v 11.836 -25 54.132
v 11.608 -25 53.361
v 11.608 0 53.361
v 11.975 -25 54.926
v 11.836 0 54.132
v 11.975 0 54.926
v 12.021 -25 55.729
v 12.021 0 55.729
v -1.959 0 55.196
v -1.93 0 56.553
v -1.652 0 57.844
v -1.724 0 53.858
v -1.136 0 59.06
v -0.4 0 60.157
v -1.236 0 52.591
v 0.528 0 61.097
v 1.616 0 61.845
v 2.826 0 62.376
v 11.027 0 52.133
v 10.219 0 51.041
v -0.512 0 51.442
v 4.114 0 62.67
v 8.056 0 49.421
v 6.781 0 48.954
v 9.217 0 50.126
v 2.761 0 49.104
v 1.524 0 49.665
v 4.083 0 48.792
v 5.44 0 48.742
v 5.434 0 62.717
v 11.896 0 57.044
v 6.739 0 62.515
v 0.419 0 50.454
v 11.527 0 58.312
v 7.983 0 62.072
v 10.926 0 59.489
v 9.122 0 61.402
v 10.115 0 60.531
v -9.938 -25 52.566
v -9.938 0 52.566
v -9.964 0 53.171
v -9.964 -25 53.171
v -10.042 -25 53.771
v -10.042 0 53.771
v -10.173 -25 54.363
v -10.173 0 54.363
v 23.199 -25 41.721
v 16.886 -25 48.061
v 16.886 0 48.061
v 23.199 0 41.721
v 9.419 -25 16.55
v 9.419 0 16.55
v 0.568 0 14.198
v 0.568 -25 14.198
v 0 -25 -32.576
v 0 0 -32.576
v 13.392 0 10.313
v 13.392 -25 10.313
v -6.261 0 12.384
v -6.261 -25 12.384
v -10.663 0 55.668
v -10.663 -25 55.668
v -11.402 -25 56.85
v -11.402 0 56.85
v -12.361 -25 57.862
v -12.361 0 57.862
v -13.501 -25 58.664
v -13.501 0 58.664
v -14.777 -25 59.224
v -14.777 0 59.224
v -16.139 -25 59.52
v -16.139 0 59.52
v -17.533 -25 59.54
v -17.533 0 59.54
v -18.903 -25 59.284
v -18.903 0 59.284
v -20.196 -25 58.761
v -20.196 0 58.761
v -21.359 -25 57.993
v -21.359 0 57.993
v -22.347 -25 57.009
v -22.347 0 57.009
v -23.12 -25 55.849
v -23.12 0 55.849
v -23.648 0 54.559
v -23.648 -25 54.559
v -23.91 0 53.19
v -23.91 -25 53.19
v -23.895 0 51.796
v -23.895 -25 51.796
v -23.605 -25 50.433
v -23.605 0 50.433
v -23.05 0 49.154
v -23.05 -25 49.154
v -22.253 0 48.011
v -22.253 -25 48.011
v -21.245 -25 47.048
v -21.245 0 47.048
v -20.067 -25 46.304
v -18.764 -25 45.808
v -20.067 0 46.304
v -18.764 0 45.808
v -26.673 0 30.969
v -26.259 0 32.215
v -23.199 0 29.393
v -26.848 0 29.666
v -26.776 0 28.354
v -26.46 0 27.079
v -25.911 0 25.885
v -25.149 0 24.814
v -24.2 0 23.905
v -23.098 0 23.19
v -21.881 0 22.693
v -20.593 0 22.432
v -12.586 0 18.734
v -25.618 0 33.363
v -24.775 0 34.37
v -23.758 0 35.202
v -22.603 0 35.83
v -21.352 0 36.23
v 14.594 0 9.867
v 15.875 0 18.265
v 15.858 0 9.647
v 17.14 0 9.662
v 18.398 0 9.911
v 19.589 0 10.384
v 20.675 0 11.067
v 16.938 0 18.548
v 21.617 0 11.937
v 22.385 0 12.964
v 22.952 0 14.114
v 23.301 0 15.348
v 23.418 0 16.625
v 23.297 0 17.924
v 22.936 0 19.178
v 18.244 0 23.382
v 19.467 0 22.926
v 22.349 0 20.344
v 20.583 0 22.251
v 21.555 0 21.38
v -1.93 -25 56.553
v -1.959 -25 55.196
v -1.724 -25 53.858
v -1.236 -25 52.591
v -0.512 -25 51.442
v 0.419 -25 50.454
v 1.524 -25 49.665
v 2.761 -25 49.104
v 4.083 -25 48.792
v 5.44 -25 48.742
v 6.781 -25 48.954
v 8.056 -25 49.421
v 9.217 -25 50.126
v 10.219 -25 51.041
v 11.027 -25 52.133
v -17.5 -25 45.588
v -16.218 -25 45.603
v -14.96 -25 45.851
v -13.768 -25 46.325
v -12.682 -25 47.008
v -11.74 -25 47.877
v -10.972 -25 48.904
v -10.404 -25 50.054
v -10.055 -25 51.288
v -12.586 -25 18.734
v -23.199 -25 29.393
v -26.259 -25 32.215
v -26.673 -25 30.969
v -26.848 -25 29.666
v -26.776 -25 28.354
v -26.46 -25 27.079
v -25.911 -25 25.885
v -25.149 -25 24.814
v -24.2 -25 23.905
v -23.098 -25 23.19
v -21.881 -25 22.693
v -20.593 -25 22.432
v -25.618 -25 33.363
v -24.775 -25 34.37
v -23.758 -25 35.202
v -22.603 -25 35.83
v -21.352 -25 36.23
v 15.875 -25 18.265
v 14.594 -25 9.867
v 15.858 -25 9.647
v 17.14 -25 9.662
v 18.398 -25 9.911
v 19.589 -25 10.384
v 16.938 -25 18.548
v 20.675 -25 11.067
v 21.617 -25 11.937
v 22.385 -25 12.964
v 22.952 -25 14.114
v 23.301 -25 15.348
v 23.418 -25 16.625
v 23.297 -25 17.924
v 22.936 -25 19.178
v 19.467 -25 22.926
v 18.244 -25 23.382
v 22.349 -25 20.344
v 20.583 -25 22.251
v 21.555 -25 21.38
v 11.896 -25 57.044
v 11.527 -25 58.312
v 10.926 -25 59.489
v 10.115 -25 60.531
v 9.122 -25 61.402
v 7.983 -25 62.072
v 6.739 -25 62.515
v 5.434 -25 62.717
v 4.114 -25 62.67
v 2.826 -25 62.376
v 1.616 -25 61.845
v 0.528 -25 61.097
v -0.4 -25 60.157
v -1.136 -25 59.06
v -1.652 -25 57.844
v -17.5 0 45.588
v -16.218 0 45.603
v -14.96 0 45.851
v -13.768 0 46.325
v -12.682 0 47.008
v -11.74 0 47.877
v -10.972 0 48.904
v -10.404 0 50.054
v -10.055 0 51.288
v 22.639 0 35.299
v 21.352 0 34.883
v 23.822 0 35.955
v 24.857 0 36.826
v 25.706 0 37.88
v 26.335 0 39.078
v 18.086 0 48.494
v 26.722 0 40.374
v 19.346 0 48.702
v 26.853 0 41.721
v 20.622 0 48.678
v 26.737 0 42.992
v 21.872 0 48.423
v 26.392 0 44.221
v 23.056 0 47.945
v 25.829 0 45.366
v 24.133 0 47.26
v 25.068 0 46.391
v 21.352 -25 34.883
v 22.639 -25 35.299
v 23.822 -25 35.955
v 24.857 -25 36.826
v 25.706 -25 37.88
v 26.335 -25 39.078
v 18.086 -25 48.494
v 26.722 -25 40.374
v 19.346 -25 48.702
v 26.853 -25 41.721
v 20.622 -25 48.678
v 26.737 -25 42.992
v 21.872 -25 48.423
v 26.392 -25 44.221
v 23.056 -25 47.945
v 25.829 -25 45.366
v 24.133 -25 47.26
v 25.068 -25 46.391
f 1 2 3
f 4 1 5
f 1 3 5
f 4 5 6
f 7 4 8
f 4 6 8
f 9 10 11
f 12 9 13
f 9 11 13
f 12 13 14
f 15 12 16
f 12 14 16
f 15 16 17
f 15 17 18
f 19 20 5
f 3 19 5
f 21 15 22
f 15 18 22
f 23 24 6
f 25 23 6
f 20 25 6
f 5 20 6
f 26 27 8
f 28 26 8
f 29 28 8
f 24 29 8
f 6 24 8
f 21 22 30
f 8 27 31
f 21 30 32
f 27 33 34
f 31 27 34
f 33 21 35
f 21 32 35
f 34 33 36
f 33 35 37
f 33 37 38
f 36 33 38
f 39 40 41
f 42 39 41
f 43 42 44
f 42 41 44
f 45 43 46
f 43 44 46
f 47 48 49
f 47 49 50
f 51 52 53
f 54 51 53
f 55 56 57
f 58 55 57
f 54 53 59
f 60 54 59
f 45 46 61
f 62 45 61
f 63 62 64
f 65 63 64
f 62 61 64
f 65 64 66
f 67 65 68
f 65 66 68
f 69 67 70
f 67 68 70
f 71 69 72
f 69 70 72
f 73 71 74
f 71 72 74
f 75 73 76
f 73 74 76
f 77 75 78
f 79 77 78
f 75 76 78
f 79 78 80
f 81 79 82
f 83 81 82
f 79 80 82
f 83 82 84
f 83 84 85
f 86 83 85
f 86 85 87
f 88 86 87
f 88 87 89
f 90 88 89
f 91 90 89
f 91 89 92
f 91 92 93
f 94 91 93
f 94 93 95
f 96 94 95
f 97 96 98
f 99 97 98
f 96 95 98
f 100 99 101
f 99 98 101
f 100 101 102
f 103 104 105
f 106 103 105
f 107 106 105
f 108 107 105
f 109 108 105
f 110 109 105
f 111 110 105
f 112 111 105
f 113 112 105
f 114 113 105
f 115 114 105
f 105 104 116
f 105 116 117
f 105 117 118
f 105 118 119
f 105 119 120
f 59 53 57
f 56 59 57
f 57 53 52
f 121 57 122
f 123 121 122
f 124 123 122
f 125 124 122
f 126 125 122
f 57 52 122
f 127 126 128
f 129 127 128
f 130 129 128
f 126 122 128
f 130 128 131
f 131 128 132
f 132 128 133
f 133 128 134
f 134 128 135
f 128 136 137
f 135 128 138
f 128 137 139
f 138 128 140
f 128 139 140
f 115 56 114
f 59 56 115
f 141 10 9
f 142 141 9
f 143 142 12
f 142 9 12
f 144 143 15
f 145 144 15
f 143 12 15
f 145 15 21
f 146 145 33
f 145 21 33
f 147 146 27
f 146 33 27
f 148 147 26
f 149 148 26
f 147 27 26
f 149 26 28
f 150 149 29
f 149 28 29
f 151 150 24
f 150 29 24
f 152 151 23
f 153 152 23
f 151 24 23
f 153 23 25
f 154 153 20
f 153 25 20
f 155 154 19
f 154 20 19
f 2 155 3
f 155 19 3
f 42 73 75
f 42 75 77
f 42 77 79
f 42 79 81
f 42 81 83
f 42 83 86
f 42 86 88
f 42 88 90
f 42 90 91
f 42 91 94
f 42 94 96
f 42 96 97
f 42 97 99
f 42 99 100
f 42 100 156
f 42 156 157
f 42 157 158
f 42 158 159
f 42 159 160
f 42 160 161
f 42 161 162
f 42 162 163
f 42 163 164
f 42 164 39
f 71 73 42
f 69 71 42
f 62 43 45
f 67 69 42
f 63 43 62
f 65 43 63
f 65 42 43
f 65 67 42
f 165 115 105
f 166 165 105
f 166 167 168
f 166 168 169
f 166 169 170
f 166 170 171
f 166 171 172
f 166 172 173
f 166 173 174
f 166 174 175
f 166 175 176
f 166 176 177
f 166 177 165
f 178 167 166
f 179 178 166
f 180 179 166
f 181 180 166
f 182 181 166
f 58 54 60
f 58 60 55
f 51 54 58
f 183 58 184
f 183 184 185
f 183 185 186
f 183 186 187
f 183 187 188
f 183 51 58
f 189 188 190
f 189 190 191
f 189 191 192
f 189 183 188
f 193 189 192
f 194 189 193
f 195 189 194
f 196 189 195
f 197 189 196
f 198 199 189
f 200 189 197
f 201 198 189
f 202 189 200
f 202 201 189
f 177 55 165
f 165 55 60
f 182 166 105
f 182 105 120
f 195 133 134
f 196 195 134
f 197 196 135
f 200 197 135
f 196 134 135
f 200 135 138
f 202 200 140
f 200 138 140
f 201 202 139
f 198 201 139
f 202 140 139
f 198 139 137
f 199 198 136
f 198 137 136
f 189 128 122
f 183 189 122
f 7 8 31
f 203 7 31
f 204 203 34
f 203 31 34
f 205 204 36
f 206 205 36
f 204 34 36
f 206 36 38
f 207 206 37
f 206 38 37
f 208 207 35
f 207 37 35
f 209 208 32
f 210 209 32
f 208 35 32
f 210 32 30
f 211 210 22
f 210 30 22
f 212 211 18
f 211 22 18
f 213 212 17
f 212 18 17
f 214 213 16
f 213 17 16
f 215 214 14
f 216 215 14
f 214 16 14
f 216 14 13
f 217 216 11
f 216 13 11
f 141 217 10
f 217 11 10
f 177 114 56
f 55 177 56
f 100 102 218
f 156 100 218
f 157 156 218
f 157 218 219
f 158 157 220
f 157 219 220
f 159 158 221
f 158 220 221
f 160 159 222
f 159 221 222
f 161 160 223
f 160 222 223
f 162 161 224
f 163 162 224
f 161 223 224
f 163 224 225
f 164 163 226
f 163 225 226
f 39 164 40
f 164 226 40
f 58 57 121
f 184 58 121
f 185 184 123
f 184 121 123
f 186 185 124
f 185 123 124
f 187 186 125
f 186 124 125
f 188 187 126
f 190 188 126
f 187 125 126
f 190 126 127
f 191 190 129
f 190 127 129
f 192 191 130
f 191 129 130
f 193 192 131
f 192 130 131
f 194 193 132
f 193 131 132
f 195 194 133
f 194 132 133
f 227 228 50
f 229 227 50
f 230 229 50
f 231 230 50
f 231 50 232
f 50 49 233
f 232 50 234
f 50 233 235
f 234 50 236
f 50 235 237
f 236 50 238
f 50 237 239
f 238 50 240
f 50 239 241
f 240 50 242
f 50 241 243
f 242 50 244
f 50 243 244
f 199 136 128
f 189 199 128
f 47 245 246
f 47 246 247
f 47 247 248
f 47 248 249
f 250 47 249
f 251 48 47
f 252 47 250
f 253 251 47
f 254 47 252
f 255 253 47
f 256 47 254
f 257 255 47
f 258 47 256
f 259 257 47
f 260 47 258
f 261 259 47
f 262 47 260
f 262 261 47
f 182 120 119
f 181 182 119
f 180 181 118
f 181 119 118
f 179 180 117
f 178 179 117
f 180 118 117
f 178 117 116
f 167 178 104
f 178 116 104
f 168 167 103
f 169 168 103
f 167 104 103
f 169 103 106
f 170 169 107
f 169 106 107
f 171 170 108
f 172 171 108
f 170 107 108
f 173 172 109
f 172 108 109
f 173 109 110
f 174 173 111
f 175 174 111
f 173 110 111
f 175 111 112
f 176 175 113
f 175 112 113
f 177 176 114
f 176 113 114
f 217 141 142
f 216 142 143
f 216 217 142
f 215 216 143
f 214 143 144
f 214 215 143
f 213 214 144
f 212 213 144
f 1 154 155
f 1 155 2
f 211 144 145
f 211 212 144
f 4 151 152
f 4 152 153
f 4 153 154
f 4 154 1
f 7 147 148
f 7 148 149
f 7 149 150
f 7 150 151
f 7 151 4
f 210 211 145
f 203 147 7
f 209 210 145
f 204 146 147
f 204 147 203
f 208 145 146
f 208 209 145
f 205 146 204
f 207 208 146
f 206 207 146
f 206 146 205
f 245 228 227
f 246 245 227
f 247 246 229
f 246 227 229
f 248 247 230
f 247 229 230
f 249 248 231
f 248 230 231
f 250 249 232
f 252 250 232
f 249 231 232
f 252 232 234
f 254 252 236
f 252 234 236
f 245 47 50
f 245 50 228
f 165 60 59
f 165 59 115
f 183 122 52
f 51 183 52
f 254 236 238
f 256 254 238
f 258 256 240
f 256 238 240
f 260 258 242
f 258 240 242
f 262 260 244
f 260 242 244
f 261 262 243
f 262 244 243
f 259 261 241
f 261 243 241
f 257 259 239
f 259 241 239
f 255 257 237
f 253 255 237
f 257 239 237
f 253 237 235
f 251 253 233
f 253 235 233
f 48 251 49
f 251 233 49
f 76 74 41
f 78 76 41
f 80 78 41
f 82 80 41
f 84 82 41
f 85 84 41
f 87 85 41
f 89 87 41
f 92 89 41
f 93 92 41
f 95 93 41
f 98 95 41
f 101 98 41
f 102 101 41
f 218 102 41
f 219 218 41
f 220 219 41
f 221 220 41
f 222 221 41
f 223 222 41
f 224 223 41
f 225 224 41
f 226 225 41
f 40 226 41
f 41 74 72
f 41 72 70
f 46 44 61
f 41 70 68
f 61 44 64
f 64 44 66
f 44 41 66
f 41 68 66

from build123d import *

# Parameters (mm, degrees)
F1_DEPTH = 25


with BuildPart() as f1:
    # F0 (on Front) → F1 (new body)
    with BuildSketch(Plane.XZ):
        with BuildLine():
            Line((18.2441764877, 23.3824430568), (16.9378220156, 18.5476241928))
            Line((16.9378220156, 18.5476241928), (15.8752199276, 18.2652868666))
            Line((15.8752199276, 18.2652868666), (13.3920497807, 10.3127253695))
            ThreePointArc((13.3920497807, 10.3127253695), (20.1476457227, 10.7009431346), (23.4182735487, 16.6247749341))
            ThreePointArc((23.4182735487, 16.6247749341), (21.976210242, 20.8802819207), (18.2441764877, 23.3824430568))
        make_face()
        with BuildLine():
            Line((13.3920497807, 10.3127253695), (15.8752199276, 18.2652868666))
            Line((15.8752199276, 18.2652868666), (9.4186755166, 16.5497590075))
            ThreePointArc((9.4186755166, 16.5497590075), (10.5145101014, 12.8637142914), (13.3920497807, 10.3127253695))
        make_face()
        with BuildLine():
            ThreePointArc((13.3920497807, 10.3127253695), (10.5145101014, 12.8637142914), (9.4186755166, 16.5497590075))
            Line((9.4186755166, 16.5497590075), (0.5681722049, 14.1981473662))
            ThreePointArc((0.5681722049, 14.1981473662), (-8.5434427291, 9.1162877381), (-12.5855881849, 18.734389635))
            Line((-12.5855881849, 18.734389635), (-16.8857592738, 23.0526269106))
            ThreePointArc((-16.8857592738, 23.0526269106), (-18.6970412303, 22.4886563526), (-20.5932388995, 22.4317396104))
            Line((-20.5932388995, 22.4317396104), (0, -32.5764417648))
            Line((0, -32.5764417648), (13.3920497807, 10.3127253695))
        make_face()
        with BuildLine():
            ThreePointArc((-12.5855881849, 18.734389635), (-8.5434427291, 9.1162877381), (0.5681722049, 14.1981473662))
            Line((0.5681722049, 14.1981473662), (-6.2612998485, 12.3835312456))
            Line((-6.2612998485, 12.3835312456), (-12.5855881849, 18.734389635))
        make_face()
        with BuildLine():
            Line((-23.1991218641, 29.3925136519), (-20.5932388995, 22.4317396104))
            ThreePointArc((-20.5932388995, 22.4317396104), (-18.6970412303, 22.4886563526), (-16.8857592738, 23.0526269106))
            Line((-16.8857592738, 23.0526269106), (-23.1991218641, 29.3925136519))
        make_face()
        with BuildLine():
            ThreePointArc((-21.351579017, 36.2302710908), (-26.8426747205, 29.0083871043), (-20.5932388995, 22.4317396104))
            Line((-20.5932388995, 22.4317396104), (-23.1991218641, 29.3925136519))
            Line((-23.1991218641, 29.3925136519), (-21.3515790169, 36.2302710908))
        make_face()
    extrude(amount=F1_DEPTH)


with BuildPart() as f1b:
    # F0 (on Front) → F1, piece 2 (new body)
    with BuildSketch(Plane.XZ):
        with BuildLine():
            Line((23.1991218641, 41.7206995462), (21.3515790169, 34.8829421073))
            ThreePointArc((21.351579017, 34.8829421073), (25.307051013, 37.3325620056), (26.8532221814, 41.7206995462))
            ThreePointArc((26.8532221814, 41.7206995462), (23.6100665785, 47.6271468859), (16.8857592738, 48.0605862875))
            Line((16.8857592738, 48.0605862875), (23.1991218641, 41.7206995462))
        make_face()
    extrude(amount=F1_DEPTH)


with BuildPart() as f1c:
    # F0 (on Front) → F1, piece 3 (new body)
    with BuildSketch(Plane.XZ):
        with BuildLine():
            ThreePointArc((-1.9303688689, 56.5531251129), (3.414311862, 48.916146138), (11.6080114951, 53.3605073181))
            Line((11.6080114951, 53.3605073181), (6.2612998485, 58.7296819525))
            Line((6.2612998485, 58.7296819525), (4.6632730761, 58.3050802966))
            Line((4.6632730761, 58.3050802966), (-1.9303688689, 56.5531251129))
        make_face()
        with BuildLine():
            Line((6.2612998485, 58.7296819525), (11.6080114951, 53.3605073181))
            ThreePointArc((11.6080114951, 53.3605073181), (11.9169654414, 54.5270226619), (12.0209804834, 55.7292670045))
            ThreePointArc((12.0209804834, 55.7292670045), (5.4336271447, 62.7170937577), (-1.9303688689, 56.5531251129))
            Line((-1.9303688689, 56.5531251129), (4.6632730761, 58.3050802966))
            Line((4.6632730761, 58.3050802966), (6.2612998485, 58.7296819525))
        make_face()
    extrude(amount=F1_DEPTH)


with BuildPart() as f1d:
    # F0 (on Front) → F1, piece 4 (new body)
    with BuildSketch(Plane.XZ):
        with BuildLine():
            ThreePointArc((-10.1725582814, 54.3631447367), (-21.8771828108, 57.5257013967), (-18.7637249546, 45.8079208825))
            Line((-18.7637249546, 45.8079208825), (-16.9378220156, 52.5655890053))
            Line((-16.9378220156, 52.5655890053), (-10.1725582814, 54.3631447367))
        make_face()
        with BuildLine():
            Line((-16.9378220156, 52.5655890053), (-18.7637249546, 45.8079208825))
            ThreePointArc((-18.7637249546, 45.8079208825), (-12.6823150289, 47.007652312), (-9.9378220156, 52.5655890053))
            ThreePointArc((-9.9378220156, 52.5655890053), (-9.9967541533, 53.4719978151), (-10.1725582814, 54.3631447367))
            Line((-10.1725582814, 54.3631447367), (-16.9378220156, 52.5655890053))
        make_face()
    extrude(amount=F1_DEPTH)


solid = Compound([f1.part, f1b.part, f1c.part, f1d.part])
